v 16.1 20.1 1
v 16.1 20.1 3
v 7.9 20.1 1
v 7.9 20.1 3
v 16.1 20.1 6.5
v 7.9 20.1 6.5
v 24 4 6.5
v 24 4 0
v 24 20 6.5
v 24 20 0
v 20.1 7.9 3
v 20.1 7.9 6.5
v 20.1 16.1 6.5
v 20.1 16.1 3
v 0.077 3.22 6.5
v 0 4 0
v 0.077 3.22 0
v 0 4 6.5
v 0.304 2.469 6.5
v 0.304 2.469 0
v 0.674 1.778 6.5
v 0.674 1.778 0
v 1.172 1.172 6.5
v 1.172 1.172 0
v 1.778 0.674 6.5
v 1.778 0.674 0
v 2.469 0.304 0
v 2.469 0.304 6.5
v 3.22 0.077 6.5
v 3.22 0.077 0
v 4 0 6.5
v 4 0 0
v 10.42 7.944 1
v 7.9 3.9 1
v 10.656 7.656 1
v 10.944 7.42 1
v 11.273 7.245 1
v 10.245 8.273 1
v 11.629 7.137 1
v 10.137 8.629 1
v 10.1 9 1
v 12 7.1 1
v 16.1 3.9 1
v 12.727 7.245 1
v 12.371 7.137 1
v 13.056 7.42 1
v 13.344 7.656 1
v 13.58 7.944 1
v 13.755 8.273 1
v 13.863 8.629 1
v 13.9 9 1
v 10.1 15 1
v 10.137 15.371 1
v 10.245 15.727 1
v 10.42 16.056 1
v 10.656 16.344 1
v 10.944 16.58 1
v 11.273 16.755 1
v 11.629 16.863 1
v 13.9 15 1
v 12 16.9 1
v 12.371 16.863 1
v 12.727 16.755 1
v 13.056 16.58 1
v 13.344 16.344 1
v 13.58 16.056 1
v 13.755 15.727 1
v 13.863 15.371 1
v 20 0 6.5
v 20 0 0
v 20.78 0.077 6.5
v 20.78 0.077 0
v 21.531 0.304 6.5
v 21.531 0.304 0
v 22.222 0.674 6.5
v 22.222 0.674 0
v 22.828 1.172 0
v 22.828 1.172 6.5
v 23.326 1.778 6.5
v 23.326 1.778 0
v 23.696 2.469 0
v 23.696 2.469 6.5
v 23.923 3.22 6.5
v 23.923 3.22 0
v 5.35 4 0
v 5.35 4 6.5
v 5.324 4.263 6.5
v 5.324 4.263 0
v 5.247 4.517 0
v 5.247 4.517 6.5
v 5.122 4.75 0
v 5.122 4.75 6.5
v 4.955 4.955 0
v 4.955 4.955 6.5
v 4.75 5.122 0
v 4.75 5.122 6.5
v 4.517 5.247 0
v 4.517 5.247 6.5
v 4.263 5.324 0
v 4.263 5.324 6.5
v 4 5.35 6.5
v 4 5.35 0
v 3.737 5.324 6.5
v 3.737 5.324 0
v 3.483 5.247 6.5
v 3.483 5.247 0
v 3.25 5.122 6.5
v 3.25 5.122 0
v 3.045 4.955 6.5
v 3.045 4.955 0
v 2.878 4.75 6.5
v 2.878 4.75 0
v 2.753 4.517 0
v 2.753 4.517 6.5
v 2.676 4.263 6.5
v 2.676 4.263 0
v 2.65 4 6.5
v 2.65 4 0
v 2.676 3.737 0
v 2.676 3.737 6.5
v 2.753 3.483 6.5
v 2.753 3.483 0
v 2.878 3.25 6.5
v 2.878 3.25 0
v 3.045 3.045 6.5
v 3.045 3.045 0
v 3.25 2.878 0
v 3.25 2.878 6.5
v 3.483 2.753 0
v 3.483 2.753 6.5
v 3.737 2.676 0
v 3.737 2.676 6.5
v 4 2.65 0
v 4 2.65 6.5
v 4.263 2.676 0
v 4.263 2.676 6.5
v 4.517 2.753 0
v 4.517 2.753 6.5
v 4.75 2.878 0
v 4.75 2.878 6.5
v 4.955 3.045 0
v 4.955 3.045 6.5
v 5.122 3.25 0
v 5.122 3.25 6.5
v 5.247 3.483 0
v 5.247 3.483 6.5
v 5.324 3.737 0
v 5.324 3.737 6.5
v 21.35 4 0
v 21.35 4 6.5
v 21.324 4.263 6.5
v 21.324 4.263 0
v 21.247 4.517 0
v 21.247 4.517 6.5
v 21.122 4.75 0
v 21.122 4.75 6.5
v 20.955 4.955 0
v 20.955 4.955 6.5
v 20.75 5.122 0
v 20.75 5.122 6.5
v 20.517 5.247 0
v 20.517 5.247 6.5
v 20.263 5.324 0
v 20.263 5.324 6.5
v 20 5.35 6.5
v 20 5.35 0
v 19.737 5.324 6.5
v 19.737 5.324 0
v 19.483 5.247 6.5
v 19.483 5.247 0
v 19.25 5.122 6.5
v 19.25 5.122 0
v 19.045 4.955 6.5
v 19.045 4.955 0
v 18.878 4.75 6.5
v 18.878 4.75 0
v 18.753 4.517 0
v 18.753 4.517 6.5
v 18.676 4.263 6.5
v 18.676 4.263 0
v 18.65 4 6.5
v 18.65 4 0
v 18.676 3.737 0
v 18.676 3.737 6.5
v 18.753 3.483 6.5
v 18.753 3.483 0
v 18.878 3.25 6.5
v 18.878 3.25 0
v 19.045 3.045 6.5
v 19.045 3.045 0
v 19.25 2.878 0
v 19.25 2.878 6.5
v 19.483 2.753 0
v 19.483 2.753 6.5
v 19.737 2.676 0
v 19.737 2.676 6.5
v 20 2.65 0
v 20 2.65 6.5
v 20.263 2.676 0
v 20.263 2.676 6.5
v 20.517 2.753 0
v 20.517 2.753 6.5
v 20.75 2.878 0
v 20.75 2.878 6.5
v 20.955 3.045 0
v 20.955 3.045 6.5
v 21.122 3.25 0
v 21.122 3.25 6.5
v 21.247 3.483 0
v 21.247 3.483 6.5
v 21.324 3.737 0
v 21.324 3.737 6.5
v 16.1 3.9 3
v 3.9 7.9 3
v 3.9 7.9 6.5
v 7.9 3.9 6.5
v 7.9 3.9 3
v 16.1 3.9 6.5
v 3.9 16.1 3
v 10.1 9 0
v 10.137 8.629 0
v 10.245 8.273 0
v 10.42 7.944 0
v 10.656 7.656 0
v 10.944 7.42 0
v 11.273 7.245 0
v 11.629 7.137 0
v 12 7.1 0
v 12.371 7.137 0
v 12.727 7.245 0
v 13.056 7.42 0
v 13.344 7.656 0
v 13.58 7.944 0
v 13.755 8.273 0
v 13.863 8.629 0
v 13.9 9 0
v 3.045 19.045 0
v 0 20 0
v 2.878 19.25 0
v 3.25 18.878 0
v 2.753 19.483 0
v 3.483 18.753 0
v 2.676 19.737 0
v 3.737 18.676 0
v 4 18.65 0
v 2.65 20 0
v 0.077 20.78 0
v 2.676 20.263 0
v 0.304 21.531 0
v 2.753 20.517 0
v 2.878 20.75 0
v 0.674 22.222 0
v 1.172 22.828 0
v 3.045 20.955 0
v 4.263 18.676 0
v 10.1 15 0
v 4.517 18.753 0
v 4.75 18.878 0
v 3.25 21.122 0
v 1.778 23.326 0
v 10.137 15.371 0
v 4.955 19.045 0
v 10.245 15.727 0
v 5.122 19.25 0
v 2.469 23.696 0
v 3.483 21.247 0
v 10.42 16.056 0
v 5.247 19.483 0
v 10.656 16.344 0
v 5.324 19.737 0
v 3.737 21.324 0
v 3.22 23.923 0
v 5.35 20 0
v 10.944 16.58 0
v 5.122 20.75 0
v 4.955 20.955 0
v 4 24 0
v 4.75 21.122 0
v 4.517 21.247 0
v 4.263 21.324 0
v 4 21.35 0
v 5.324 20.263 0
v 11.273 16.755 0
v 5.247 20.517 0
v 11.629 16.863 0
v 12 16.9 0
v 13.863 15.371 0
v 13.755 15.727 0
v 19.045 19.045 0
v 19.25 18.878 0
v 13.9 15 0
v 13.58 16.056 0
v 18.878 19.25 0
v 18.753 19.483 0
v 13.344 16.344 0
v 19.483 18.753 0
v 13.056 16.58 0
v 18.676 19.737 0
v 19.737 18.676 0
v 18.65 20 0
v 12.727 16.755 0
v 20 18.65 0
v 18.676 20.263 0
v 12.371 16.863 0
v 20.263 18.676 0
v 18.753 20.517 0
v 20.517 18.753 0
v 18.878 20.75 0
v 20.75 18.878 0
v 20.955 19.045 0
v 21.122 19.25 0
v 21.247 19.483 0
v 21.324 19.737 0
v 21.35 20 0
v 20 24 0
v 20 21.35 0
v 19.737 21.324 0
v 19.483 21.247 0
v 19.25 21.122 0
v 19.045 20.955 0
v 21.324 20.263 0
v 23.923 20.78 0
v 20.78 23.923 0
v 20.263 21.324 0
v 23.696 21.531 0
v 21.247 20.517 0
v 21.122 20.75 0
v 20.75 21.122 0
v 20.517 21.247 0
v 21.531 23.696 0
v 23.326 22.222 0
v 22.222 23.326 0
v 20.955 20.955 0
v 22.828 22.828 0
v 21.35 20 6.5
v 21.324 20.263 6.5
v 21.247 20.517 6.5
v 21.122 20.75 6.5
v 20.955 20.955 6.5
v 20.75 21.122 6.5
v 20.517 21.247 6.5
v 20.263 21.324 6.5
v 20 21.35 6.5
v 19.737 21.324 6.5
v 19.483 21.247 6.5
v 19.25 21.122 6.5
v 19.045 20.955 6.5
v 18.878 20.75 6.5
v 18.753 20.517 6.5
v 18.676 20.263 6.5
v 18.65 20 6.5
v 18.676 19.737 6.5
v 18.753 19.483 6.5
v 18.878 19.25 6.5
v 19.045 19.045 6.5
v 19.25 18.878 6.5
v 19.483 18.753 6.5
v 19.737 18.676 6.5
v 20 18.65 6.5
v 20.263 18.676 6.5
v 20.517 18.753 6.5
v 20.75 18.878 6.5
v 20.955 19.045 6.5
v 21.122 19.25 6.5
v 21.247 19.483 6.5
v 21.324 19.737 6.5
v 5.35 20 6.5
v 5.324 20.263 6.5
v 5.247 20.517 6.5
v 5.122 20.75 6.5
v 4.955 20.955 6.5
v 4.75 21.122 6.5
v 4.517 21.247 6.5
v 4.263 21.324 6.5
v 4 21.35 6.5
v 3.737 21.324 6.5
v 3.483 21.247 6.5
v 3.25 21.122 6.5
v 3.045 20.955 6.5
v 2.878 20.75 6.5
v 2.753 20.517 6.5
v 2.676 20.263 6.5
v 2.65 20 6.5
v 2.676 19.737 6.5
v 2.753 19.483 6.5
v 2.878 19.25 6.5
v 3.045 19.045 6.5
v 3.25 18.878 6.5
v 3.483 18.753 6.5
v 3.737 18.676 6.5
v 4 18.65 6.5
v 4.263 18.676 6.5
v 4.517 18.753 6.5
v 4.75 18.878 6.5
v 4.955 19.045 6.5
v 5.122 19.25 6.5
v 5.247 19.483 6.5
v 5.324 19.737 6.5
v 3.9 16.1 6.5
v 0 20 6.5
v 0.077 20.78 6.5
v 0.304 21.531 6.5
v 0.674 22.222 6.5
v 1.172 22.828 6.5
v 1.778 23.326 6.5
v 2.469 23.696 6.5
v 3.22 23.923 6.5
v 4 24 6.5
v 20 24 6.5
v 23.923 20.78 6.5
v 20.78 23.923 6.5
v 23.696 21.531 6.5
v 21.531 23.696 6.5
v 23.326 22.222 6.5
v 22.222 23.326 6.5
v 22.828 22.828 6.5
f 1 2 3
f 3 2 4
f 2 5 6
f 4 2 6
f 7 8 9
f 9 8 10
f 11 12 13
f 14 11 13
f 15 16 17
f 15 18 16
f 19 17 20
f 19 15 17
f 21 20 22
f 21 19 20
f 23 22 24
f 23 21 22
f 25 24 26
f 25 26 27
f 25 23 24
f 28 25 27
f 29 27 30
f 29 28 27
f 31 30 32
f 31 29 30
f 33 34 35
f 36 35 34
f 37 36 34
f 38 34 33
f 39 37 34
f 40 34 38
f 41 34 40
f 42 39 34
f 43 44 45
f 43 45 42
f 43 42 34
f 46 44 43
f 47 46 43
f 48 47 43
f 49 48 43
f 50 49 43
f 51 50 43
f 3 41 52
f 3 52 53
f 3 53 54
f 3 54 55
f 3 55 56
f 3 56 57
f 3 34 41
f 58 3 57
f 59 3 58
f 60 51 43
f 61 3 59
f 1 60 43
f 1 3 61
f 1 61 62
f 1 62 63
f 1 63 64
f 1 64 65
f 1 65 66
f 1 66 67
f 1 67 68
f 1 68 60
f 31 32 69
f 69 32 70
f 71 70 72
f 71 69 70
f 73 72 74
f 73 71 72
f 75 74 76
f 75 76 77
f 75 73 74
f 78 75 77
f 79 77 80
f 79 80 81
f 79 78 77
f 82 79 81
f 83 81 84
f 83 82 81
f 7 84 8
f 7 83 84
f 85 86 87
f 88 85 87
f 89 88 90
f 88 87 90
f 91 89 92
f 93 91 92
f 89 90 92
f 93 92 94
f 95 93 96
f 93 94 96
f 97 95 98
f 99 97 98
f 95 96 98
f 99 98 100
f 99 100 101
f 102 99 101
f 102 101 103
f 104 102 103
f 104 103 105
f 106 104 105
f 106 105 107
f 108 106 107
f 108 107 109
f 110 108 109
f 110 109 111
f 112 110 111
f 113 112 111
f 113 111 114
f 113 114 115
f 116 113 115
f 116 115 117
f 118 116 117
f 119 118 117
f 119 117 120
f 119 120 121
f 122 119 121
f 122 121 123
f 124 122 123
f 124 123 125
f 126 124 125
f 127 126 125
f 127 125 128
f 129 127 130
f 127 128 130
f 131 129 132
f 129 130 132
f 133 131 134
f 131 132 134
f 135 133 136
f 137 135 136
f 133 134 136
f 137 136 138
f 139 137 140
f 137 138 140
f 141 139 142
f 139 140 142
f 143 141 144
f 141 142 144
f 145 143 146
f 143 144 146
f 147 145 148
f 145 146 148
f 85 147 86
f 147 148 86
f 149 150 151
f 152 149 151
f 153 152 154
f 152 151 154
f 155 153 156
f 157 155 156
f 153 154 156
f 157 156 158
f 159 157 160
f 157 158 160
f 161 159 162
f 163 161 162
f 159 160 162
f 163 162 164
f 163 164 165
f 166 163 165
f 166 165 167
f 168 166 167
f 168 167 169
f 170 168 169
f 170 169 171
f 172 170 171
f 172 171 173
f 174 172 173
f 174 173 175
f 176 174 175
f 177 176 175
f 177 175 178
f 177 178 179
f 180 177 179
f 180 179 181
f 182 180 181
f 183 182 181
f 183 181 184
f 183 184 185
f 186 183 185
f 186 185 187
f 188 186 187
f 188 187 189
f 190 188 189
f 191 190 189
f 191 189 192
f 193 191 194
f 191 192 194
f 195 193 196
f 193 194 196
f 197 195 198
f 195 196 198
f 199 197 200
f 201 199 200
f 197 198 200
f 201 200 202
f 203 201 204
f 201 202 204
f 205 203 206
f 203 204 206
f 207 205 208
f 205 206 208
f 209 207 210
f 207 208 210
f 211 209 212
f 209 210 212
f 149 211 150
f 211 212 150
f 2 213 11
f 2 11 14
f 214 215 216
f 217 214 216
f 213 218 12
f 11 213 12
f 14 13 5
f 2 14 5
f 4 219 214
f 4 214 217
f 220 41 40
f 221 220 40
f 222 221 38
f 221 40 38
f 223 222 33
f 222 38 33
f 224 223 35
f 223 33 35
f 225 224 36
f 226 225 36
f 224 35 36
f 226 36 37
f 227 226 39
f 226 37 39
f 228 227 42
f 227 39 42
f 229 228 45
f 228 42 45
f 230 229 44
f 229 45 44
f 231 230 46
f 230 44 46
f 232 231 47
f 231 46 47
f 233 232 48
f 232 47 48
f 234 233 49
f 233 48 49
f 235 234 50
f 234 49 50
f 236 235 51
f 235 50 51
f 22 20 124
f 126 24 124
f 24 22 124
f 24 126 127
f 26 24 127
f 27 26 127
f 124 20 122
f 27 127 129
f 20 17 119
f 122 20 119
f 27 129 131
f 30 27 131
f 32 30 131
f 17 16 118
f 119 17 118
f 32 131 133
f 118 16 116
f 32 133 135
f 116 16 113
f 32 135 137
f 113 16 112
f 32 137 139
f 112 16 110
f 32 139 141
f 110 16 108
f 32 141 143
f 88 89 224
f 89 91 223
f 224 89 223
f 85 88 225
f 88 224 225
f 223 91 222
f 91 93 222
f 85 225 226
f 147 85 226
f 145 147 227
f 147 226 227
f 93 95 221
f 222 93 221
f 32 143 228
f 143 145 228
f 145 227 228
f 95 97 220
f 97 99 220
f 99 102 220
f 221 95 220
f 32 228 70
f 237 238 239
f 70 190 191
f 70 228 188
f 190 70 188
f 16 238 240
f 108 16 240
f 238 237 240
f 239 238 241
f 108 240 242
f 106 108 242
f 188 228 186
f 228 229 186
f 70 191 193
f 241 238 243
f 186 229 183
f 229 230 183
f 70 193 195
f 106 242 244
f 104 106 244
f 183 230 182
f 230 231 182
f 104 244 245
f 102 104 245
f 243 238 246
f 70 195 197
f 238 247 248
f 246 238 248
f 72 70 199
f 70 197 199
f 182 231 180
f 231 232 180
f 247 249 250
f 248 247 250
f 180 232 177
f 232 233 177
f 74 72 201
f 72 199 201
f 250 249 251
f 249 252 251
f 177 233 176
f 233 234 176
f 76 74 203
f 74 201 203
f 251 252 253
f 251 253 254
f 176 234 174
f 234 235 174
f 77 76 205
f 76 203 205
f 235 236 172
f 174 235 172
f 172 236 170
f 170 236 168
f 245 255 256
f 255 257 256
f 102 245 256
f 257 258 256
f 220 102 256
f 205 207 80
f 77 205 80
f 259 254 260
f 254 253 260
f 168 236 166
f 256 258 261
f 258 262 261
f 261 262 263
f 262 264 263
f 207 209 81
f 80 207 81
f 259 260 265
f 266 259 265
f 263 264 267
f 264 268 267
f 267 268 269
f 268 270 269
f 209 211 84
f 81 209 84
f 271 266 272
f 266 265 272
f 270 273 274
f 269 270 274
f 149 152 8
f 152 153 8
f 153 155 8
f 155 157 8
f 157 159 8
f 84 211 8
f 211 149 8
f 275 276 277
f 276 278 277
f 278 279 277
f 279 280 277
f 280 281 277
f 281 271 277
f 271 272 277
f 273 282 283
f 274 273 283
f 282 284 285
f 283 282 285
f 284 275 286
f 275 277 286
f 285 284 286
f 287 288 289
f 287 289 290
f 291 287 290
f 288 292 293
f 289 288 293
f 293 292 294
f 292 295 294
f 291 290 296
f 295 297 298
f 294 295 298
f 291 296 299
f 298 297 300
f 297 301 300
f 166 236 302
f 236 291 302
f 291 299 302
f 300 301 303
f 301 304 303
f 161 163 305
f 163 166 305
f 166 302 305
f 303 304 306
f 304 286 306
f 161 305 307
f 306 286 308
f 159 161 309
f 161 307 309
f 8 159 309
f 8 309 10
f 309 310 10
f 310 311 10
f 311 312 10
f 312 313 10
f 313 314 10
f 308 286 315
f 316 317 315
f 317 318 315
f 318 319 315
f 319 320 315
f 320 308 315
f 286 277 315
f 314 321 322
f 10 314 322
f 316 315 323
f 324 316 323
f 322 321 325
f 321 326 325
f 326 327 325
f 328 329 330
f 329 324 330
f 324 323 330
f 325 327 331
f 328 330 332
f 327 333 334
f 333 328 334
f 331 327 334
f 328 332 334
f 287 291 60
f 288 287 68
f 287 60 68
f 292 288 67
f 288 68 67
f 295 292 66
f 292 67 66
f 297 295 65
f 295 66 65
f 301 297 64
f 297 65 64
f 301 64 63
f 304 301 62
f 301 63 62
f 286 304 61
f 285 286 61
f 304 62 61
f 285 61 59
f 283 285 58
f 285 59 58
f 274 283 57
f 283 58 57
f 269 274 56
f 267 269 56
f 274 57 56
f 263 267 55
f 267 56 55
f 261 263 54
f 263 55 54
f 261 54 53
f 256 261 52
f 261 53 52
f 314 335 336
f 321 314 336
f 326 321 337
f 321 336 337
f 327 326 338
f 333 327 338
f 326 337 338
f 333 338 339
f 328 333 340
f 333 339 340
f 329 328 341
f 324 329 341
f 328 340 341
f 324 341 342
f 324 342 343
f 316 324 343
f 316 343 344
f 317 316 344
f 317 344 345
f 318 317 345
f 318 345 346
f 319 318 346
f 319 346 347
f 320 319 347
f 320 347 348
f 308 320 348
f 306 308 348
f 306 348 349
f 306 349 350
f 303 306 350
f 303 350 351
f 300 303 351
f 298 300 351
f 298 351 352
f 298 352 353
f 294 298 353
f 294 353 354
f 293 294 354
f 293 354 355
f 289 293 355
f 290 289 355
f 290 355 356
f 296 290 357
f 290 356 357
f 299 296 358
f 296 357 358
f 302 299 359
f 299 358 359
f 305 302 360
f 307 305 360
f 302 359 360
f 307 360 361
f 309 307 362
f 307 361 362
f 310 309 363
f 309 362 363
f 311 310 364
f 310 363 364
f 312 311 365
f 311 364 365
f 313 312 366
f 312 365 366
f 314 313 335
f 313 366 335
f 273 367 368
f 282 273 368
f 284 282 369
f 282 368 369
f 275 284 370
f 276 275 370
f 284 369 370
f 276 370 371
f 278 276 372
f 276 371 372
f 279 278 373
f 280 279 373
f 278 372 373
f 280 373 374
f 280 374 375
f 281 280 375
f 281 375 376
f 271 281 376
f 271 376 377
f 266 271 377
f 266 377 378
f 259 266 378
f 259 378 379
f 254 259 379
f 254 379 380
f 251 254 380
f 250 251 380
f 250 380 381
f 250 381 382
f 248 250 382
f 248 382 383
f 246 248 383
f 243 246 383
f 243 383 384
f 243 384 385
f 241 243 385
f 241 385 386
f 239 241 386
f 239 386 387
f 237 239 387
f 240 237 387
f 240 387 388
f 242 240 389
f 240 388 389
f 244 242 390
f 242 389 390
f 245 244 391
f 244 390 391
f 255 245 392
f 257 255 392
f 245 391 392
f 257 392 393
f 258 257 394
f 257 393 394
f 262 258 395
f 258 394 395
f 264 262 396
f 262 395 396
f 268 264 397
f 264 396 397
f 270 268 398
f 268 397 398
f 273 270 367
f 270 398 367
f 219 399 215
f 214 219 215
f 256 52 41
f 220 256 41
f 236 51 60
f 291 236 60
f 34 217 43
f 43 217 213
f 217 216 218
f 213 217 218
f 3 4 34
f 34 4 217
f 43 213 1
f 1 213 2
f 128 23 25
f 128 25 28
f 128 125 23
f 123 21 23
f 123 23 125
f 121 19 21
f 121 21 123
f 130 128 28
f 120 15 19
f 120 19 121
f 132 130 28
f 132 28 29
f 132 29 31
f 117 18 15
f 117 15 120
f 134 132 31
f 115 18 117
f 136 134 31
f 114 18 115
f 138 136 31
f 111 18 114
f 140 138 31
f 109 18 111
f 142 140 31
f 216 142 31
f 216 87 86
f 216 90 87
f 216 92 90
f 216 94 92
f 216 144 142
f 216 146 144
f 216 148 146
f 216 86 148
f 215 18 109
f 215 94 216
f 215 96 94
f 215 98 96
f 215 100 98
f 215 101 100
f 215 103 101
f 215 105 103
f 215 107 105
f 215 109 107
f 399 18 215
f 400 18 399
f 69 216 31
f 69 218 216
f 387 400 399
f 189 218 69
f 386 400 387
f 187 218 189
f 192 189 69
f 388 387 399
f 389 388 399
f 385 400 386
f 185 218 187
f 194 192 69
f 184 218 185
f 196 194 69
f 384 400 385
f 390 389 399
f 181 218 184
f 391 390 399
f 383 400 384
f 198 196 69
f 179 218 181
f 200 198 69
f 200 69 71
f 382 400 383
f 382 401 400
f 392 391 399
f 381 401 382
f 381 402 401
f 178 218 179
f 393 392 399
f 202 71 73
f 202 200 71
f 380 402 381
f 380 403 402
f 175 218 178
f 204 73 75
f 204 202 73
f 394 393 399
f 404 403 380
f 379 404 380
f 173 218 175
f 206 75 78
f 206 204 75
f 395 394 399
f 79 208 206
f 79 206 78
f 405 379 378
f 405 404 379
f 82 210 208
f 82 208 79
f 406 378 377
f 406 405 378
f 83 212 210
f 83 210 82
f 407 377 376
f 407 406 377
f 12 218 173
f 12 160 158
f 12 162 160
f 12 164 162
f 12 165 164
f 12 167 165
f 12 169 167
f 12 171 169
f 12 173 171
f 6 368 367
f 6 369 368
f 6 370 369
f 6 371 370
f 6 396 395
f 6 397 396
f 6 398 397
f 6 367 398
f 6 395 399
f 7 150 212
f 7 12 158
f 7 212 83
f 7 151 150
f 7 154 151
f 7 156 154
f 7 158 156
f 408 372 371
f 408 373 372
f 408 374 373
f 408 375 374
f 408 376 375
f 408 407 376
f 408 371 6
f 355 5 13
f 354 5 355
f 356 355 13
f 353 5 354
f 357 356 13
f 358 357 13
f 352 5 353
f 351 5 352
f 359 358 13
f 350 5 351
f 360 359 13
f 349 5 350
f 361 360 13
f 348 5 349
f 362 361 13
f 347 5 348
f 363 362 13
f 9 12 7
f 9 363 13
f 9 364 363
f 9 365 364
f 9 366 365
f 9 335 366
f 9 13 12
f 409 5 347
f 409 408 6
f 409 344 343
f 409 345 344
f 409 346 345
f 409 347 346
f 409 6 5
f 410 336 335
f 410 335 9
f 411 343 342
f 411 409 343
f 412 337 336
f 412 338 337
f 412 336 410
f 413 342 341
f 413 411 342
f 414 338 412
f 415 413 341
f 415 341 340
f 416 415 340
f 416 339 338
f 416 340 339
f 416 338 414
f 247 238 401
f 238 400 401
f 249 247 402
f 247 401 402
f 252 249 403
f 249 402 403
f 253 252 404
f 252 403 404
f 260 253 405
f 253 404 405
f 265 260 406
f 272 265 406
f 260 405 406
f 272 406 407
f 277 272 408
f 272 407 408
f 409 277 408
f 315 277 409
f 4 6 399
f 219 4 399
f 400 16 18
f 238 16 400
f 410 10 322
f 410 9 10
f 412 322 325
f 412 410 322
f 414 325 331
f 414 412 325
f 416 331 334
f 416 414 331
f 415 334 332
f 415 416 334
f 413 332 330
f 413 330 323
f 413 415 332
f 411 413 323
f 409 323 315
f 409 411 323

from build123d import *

# Parameters (mm, degrees)
F0_W      = 24
F0_H      = 24
F1_DEPTH  = 6.5
F4_R      = 4
F5_R      = 1.35
F6_DEPTH  = 6.501
F8_DEPTH  = 5.5
F9_DEPTH  = 6.501
F10_DEPTH = 3.5


with BuildPart() as f1:
    # F0 (on Top) → F1 (new body)
    with BuildSketch(Plane.XY):
        with Locations((12, 12)):
            Rectangle(F0_W, F0_H)
    extrude(amount=F1_DEPTH)

    # F4
    f4_edges = [f1.edges().sort_by_distance(p)[0] for p in [
        (0, 0, 3.25),
        (24, 0, 3.25),
        (24, 24, 3.25),
        (0, 24, 3.25),
    ]]
    fillet(f4_edges, radius=F4_R)

    # F5 (on face) → F6 (cut, through all)
    with BuildSketch(Plane.XY.offset(6.5)):
        with Locations((4, 4)):
            Circle(F5_R)
        with Locations((4, 20)):
            Circle(F5_R)
        with Locations((20, 4)):
            Circle(F5_R)
        with Locations((20, 20)):
            Circle(F5_R)
    extrude(amount=-F6_DEPTH, mode=Mode.SUBTRACT)

    # F7 (on face) → F8 (cut, through all)
    with BuildSketch(Plane.XY.offset(6.5)):
        Polygon((16.1, 3.9), (16.1, 12), (16.1, 20.1), (7.9, 20.1), (7.9, 12), (7.9, 3.9), align=None)
        with BuildLine():
            Line((10.1, 9), (10.1, 15))
            ThreePointArc((10.1, 15), (12, 16.9), (13.9, 15))
            Line((13.9, 15), (13.9, 9))
            ThreePointArc((13.9, 9), (12, 7.1), (10.1, 9))
        make_face(mode=Mode.SUBTRACT)
    extrude(amount=-F8_DEPTH, mode=Mode.SUBTRACT)

    # F7 (on face) → F9 (cut, through all)
    with BuildSketch(Plane.XY.offset(6.5)):
        with BuildLine():
            ThreePointArc((13.9, 15), (12, 16.9), (10.1, 15))
            Line((10.1, 15), (10.1, 9))
            ThreePointArc((10.1, 9), (12, 7.1), (13.9, 9))
            Line((13.9, 9), (13.9, 15))
        make_face()
    extrude(amount=-F9_DEPTH, mode=Mode.SUBTRACT)

    # F7 (on face) → F10 (cut, through all)
    with BuildSketch(Plane.XY.offset(6.5)):
        Polygon((7.9, 12), (7.9, 20.1), (3.9, 16.1), (3.9, 12), (3.9, 7.9), (7.9, 3.9), align=None)
        Polygon((16.1, 20.1), (16.1, 12), (16.1, 3.9), (20.1, 7.9), (20.1, 12), (20.1, 16.1), align=None)
    extrude(amount=-F10_DEPTH, mode=Mode.SUBTRACT)


solid = f1.part
